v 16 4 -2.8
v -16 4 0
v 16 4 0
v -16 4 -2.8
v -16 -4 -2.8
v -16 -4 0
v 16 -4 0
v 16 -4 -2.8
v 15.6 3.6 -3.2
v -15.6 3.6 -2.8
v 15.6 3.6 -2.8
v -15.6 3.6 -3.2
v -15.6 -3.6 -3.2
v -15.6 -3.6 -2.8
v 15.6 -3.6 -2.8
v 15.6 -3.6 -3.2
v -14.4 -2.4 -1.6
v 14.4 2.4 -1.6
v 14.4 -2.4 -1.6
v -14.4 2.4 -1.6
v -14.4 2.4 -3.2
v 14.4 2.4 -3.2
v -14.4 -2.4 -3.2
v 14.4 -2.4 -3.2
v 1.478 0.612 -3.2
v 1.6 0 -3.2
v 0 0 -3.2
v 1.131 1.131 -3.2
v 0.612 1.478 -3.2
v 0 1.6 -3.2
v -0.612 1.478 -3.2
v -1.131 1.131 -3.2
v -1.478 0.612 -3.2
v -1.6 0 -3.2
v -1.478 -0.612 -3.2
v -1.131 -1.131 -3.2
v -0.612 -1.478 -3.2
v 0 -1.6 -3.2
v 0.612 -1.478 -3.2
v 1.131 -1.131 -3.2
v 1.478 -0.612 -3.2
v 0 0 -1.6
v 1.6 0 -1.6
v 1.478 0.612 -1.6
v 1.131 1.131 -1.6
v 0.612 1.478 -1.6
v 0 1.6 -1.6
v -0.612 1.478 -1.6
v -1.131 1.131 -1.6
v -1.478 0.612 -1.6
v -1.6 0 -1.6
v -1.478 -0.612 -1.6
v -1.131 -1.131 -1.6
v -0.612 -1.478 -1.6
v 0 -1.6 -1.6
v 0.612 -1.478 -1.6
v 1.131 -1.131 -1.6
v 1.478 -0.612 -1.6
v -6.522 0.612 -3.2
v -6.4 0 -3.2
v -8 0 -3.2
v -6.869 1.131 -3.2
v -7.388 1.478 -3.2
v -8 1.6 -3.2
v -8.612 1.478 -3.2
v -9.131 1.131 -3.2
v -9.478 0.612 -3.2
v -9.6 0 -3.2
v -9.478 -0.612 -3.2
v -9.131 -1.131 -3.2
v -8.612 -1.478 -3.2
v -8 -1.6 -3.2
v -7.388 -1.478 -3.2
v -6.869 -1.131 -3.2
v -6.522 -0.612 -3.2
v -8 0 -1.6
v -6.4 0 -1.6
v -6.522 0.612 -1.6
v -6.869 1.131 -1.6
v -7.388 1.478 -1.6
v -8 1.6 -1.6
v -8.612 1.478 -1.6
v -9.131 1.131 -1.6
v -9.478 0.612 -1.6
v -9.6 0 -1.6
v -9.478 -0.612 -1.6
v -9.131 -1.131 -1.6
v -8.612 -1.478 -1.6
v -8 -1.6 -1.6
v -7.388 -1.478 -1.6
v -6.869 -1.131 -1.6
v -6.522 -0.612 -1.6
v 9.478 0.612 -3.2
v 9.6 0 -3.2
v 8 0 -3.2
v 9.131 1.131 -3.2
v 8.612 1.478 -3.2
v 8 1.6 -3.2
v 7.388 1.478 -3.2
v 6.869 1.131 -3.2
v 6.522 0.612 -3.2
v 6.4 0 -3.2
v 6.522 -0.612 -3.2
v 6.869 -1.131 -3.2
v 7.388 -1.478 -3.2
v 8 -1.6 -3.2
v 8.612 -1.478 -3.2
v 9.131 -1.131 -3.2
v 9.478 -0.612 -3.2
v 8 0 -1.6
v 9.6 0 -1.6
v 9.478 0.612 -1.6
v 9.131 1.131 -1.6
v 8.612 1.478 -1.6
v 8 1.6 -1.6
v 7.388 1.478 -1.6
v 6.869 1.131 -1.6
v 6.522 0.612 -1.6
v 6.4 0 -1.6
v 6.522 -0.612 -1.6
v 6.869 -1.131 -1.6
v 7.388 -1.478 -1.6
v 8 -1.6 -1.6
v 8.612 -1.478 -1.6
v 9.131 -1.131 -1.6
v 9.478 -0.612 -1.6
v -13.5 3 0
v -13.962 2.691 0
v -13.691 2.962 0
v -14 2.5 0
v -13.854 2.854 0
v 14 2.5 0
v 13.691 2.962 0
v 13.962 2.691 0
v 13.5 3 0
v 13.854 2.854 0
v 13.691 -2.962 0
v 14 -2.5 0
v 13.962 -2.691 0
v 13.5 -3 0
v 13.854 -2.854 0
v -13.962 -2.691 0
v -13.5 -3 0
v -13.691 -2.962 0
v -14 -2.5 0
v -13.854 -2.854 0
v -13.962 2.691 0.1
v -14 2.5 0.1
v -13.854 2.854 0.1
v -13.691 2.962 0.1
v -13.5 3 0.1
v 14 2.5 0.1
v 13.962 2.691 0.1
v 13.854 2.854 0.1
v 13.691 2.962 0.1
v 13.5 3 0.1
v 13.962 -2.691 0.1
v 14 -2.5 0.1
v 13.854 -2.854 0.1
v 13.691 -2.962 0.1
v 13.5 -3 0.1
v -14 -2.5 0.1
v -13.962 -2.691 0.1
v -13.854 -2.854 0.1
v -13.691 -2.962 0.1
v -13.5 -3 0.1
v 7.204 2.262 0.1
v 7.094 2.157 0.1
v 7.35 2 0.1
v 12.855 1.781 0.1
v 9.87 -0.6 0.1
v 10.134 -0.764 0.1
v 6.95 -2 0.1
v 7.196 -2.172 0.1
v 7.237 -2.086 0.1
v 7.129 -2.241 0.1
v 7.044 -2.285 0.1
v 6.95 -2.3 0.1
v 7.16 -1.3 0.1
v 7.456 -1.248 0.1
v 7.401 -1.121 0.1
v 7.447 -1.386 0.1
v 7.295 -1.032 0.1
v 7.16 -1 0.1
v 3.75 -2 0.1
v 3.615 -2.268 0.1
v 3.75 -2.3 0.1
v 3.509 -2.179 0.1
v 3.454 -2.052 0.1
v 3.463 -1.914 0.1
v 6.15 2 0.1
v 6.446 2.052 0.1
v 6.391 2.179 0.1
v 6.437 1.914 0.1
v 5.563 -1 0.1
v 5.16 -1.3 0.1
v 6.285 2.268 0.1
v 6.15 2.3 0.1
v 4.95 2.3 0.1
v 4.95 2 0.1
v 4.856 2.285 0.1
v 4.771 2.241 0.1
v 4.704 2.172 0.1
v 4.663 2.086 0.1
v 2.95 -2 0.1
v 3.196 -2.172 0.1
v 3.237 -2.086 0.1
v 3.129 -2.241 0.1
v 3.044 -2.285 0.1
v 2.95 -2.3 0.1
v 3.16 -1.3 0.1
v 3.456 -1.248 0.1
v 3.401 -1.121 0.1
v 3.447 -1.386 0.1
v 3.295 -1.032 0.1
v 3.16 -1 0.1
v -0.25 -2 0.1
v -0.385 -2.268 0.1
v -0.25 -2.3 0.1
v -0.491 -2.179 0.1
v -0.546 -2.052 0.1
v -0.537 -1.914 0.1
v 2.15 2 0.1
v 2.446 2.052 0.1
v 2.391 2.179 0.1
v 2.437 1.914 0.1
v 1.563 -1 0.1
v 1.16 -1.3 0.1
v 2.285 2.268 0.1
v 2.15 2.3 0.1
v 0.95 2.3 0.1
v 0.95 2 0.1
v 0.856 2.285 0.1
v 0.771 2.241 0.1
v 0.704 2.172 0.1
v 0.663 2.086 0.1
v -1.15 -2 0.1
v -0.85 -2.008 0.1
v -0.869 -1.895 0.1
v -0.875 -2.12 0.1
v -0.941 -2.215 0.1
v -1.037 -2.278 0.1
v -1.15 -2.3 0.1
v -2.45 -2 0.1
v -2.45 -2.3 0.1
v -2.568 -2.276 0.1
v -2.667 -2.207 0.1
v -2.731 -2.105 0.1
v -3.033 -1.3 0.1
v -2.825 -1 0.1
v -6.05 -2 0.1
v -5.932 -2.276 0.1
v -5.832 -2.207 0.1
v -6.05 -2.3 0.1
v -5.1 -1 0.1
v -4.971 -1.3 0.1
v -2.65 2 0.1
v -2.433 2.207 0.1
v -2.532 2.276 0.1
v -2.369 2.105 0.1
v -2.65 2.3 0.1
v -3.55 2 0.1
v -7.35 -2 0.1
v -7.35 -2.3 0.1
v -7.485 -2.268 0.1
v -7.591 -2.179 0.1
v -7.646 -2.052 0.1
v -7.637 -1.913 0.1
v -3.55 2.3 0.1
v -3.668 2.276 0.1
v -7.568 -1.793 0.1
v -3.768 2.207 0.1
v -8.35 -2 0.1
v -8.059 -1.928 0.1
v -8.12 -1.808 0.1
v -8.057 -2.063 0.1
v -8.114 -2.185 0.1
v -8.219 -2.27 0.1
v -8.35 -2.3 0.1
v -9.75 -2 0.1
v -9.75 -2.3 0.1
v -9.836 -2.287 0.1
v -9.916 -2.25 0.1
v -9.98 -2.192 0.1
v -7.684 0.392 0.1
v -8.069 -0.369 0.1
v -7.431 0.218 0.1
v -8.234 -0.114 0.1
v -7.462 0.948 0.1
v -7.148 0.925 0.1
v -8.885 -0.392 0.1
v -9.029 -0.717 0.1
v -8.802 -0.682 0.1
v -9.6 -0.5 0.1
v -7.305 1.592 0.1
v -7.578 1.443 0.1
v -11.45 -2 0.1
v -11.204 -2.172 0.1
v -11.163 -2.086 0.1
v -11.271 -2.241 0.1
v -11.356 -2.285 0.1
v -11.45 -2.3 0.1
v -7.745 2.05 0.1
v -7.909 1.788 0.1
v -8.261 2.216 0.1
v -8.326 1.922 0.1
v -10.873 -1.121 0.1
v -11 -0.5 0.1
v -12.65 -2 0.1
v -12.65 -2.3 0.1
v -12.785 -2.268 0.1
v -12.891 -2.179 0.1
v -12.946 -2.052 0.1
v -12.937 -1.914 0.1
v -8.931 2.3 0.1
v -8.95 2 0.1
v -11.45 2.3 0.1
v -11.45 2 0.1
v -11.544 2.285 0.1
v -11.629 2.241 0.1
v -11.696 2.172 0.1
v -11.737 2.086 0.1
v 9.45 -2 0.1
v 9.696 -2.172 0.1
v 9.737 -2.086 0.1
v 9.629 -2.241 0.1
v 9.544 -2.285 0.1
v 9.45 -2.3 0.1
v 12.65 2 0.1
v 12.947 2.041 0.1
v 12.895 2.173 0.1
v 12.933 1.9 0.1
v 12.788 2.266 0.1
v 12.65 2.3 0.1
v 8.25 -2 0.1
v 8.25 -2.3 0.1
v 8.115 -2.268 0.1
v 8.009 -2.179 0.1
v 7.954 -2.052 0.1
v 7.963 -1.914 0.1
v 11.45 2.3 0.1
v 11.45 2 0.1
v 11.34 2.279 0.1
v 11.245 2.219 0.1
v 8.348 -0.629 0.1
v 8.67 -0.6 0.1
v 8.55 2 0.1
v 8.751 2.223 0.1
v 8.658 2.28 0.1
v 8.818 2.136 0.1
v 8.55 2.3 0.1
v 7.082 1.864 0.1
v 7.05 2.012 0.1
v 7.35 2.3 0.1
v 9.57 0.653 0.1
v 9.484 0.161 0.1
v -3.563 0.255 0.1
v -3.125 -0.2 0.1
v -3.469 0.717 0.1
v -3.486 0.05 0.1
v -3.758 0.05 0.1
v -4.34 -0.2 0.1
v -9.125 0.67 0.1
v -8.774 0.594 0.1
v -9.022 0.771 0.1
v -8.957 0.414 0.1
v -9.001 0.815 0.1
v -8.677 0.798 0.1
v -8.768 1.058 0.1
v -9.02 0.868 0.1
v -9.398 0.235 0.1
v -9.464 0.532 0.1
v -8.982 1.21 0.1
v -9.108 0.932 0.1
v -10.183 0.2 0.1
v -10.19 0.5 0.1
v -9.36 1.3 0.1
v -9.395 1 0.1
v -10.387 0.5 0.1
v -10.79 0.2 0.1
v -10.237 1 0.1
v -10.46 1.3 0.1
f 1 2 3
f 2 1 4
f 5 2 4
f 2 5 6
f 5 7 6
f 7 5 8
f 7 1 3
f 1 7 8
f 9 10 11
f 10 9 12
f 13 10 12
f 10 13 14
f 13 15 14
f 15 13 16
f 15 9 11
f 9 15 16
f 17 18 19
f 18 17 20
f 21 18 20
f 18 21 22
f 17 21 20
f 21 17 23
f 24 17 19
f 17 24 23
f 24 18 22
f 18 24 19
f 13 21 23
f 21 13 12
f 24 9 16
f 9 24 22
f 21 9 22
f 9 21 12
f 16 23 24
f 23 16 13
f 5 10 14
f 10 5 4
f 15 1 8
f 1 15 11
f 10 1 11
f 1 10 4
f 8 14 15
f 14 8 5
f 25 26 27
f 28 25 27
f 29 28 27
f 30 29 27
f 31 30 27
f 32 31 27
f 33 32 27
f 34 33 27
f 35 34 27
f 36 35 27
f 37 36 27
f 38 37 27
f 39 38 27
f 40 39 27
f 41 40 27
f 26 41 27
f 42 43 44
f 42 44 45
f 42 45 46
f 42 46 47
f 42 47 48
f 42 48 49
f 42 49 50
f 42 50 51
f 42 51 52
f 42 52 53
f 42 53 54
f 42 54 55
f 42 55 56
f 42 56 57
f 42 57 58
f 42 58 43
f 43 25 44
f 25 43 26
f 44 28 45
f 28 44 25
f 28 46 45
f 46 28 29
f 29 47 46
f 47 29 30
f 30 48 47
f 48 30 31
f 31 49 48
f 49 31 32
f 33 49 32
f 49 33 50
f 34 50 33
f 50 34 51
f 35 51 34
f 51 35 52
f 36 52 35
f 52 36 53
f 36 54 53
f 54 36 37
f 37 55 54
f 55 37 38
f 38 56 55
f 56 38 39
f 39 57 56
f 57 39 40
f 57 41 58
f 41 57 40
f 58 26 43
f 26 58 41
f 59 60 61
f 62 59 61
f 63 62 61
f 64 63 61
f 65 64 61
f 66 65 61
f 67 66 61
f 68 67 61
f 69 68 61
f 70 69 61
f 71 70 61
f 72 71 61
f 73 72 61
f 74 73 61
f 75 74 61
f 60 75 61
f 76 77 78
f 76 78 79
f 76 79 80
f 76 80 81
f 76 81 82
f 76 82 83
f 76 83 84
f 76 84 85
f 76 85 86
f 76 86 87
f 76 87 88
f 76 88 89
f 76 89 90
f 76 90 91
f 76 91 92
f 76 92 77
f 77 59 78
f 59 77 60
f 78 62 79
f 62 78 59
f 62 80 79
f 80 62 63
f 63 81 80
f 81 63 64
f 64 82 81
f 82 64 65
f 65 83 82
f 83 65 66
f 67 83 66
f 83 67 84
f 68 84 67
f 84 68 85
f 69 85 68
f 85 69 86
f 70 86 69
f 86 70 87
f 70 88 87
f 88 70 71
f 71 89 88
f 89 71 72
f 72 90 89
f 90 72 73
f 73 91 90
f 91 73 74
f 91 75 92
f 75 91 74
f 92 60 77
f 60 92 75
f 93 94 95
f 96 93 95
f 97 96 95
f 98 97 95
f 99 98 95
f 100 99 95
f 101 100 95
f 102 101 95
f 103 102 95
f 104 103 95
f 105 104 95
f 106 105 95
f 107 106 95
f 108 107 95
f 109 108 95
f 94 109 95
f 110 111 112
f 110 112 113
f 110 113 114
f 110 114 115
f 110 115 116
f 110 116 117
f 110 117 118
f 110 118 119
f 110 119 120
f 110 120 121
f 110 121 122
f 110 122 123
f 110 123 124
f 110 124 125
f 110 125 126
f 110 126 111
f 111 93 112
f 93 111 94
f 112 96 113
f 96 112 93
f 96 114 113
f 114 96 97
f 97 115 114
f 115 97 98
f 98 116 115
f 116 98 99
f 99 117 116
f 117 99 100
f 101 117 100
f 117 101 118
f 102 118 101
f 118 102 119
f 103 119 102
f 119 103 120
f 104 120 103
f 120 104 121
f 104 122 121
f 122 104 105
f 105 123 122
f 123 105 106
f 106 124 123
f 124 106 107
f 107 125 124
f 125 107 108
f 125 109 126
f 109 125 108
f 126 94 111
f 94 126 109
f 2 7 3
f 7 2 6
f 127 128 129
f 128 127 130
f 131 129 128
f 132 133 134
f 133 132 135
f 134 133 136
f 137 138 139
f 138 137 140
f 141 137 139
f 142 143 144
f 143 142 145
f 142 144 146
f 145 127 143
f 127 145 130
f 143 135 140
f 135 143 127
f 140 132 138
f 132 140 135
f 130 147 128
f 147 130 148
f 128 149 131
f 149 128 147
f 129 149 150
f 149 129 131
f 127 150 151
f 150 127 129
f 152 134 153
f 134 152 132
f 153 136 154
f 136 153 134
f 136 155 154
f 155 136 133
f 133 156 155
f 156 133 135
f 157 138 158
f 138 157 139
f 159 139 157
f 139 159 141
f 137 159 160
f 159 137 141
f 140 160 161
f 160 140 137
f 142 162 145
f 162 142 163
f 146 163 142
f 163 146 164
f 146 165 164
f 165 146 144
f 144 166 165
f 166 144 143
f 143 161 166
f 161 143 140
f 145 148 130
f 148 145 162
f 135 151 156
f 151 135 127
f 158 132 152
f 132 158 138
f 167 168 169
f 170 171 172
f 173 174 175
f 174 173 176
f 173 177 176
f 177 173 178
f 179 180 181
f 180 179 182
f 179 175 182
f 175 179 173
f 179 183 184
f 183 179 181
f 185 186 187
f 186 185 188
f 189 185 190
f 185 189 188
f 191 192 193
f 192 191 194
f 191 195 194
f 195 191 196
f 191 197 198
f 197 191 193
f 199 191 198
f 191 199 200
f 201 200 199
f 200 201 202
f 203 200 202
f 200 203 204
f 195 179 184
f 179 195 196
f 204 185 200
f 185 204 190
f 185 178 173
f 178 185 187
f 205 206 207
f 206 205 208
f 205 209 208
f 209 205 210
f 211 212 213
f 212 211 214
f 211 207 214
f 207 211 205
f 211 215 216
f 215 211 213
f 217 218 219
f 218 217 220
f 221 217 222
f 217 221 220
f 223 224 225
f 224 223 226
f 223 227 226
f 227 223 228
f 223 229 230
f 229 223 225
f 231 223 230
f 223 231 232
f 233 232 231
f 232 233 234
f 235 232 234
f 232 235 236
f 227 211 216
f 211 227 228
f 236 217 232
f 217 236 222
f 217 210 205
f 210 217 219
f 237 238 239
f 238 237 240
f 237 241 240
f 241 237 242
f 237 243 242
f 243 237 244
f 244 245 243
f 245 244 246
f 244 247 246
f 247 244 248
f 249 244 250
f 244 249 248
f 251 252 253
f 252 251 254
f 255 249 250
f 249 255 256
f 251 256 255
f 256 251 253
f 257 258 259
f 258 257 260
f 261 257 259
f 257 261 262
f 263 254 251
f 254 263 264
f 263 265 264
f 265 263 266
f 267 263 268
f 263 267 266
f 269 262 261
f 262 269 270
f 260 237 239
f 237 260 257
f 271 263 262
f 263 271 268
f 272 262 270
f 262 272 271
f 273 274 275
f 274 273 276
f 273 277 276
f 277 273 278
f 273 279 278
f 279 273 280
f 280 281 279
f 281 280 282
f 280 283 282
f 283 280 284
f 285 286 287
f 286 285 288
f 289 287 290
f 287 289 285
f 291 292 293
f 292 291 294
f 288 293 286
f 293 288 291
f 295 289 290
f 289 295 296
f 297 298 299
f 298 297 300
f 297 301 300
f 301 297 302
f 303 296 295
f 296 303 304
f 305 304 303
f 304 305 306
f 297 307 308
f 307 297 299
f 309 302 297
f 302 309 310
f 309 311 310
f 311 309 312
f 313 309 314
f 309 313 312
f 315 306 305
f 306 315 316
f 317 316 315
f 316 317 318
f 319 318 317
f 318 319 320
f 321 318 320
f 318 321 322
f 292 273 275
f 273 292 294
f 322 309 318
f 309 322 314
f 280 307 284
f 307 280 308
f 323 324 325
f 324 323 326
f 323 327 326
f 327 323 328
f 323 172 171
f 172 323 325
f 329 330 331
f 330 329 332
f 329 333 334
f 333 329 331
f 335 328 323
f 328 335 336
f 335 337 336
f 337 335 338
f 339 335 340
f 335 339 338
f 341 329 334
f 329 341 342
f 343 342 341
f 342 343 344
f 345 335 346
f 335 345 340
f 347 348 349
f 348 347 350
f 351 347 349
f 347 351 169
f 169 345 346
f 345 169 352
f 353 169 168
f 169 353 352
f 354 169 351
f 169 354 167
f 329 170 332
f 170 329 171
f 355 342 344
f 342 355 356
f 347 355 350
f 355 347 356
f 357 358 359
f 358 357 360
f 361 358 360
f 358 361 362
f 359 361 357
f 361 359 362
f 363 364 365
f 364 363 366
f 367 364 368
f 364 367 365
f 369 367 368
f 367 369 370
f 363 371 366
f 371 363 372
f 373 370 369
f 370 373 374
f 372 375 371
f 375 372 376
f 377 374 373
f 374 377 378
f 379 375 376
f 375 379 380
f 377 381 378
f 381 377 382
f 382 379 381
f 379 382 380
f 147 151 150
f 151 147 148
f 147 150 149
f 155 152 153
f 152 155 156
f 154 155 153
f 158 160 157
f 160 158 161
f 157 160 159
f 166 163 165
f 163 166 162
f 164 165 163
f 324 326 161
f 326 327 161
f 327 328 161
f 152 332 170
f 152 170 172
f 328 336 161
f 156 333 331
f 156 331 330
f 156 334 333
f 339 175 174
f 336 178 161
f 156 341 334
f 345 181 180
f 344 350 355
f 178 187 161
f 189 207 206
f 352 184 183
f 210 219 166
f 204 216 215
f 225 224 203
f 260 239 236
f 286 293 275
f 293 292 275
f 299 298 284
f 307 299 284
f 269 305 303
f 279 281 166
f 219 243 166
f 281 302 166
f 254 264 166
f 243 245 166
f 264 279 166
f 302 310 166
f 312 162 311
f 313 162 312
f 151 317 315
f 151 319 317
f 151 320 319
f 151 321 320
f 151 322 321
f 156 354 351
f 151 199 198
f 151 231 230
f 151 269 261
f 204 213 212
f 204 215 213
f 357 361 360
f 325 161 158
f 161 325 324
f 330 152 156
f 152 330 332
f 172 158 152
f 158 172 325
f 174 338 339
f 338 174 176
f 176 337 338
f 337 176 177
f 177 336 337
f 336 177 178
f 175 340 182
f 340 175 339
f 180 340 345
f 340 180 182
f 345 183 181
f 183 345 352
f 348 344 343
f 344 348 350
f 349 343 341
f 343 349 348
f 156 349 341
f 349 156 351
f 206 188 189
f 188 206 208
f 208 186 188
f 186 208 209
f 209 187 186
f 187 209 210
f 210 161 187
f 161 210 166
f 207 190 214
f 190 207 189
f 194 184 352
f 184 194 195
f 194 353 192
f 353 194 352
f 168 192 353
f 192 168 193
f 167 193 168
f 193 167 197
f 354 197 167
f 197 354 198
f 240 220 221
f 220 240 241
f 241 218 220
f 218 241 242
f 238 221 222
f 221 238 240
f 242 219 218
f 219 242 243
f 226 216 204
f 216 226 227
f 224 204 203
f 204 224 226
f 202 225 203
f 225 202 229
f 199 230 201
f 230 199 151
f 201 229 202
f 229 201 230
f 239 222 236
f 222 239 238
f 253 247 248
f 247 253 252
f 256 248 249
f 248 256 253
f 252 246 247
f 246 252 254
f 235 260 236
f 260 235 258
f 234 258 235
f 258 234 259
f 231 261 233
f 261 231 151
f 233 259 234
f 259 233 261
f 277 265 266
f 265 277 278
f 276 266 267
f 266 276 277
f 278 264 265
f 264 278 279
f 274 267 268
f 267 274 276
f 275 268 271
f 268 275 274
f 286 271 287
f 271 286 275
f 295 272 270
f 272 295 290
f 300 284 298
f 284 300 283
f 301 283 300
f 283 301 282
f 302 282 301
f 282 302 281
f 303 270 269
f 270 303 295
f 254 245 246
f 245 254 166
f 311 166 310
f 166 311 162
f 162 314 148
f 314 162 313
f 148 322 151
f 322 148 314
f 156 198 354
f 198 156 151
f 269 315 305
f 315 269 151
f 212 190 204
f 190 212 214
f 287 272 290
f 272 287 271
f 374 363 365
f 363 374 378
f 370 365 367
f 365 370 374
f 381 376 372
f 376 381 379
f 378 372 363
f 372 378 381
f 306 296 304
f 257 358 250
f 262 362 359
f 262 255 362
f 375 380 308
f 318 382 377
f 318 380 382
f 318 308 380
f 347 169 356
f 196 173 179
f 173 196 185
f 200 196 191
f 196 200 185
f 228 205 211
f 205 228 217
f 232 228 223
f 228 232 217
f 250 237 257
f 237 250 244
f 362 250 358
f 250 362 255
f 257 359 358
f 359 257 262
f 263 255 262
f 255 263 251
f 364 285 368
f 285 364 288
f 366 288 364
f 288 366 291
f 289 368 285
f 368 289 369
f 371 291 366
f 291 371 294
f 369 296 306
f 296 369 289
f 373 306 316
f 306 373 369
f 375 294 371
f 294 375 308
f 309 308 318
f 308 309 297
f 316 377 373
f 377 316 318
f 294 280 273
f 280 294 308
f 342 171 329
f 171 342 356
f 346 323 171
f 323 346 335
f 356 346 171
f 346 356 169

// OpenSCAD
use <../lib.scad>
use <2431.scad>
use <4106980a.scad>
function ldraw_lib__2431d0m() = [
// 0 Tile  1 x  4 with White "RALLY" on Green Sticker
// 0 Name: 2431d0m.dat
// 0 Author: Chris Böhnke [KnightOfTarenta]
// 0 !LDRAW_ORG Shortcut UPDATE 2025-03
// 0 !LICENSE Licensed under CC BY 4.0 : see CAreadme.txt
// 
// 0 BFC CERTIFY CCW
  [0,"BFC","CERTIFY"],
  [0,"BFC","CCW"],
// 
// 0 !CATEGORY Sticker Shortcut
// 0 !KEYWORDS Bricklink 2431pb013, BrickOwl 750890, Octan, outback, Outback Racer
// 0 !KEYWORDS Racing, Rally, Rallye, Set 6550, town
// 
// 0 !HISTORY 2025-03-30 [OrionP] Official Update 2025-03
// 
// 1 16 0 0 0 1 0 0 0 1 0 0 0 1 2431.dat
  [1,16,0,0,0,1,0,0,0,1,0,0,0,1, ldraw_lib__2431()],
// 1 16 0 0 0 1 0 0 0 1 0 0 0 1 4106980a.dat
  [1,16,0,0,0,1,0,0,0,1,0,0,0,1, ldraw_lib__4106980a()],
];
module ldraw_lib__2431d0m(step=0, col=false, unit=2/5, alt=false, line=0.2, solid=!$preview)
    makepoly(ldraw_lib__2431d0m(), step=step, col=col, unit=unit, alt=alt, line=line, solid=solid);
ldraw_lib__2431d0m(line=0.2);
